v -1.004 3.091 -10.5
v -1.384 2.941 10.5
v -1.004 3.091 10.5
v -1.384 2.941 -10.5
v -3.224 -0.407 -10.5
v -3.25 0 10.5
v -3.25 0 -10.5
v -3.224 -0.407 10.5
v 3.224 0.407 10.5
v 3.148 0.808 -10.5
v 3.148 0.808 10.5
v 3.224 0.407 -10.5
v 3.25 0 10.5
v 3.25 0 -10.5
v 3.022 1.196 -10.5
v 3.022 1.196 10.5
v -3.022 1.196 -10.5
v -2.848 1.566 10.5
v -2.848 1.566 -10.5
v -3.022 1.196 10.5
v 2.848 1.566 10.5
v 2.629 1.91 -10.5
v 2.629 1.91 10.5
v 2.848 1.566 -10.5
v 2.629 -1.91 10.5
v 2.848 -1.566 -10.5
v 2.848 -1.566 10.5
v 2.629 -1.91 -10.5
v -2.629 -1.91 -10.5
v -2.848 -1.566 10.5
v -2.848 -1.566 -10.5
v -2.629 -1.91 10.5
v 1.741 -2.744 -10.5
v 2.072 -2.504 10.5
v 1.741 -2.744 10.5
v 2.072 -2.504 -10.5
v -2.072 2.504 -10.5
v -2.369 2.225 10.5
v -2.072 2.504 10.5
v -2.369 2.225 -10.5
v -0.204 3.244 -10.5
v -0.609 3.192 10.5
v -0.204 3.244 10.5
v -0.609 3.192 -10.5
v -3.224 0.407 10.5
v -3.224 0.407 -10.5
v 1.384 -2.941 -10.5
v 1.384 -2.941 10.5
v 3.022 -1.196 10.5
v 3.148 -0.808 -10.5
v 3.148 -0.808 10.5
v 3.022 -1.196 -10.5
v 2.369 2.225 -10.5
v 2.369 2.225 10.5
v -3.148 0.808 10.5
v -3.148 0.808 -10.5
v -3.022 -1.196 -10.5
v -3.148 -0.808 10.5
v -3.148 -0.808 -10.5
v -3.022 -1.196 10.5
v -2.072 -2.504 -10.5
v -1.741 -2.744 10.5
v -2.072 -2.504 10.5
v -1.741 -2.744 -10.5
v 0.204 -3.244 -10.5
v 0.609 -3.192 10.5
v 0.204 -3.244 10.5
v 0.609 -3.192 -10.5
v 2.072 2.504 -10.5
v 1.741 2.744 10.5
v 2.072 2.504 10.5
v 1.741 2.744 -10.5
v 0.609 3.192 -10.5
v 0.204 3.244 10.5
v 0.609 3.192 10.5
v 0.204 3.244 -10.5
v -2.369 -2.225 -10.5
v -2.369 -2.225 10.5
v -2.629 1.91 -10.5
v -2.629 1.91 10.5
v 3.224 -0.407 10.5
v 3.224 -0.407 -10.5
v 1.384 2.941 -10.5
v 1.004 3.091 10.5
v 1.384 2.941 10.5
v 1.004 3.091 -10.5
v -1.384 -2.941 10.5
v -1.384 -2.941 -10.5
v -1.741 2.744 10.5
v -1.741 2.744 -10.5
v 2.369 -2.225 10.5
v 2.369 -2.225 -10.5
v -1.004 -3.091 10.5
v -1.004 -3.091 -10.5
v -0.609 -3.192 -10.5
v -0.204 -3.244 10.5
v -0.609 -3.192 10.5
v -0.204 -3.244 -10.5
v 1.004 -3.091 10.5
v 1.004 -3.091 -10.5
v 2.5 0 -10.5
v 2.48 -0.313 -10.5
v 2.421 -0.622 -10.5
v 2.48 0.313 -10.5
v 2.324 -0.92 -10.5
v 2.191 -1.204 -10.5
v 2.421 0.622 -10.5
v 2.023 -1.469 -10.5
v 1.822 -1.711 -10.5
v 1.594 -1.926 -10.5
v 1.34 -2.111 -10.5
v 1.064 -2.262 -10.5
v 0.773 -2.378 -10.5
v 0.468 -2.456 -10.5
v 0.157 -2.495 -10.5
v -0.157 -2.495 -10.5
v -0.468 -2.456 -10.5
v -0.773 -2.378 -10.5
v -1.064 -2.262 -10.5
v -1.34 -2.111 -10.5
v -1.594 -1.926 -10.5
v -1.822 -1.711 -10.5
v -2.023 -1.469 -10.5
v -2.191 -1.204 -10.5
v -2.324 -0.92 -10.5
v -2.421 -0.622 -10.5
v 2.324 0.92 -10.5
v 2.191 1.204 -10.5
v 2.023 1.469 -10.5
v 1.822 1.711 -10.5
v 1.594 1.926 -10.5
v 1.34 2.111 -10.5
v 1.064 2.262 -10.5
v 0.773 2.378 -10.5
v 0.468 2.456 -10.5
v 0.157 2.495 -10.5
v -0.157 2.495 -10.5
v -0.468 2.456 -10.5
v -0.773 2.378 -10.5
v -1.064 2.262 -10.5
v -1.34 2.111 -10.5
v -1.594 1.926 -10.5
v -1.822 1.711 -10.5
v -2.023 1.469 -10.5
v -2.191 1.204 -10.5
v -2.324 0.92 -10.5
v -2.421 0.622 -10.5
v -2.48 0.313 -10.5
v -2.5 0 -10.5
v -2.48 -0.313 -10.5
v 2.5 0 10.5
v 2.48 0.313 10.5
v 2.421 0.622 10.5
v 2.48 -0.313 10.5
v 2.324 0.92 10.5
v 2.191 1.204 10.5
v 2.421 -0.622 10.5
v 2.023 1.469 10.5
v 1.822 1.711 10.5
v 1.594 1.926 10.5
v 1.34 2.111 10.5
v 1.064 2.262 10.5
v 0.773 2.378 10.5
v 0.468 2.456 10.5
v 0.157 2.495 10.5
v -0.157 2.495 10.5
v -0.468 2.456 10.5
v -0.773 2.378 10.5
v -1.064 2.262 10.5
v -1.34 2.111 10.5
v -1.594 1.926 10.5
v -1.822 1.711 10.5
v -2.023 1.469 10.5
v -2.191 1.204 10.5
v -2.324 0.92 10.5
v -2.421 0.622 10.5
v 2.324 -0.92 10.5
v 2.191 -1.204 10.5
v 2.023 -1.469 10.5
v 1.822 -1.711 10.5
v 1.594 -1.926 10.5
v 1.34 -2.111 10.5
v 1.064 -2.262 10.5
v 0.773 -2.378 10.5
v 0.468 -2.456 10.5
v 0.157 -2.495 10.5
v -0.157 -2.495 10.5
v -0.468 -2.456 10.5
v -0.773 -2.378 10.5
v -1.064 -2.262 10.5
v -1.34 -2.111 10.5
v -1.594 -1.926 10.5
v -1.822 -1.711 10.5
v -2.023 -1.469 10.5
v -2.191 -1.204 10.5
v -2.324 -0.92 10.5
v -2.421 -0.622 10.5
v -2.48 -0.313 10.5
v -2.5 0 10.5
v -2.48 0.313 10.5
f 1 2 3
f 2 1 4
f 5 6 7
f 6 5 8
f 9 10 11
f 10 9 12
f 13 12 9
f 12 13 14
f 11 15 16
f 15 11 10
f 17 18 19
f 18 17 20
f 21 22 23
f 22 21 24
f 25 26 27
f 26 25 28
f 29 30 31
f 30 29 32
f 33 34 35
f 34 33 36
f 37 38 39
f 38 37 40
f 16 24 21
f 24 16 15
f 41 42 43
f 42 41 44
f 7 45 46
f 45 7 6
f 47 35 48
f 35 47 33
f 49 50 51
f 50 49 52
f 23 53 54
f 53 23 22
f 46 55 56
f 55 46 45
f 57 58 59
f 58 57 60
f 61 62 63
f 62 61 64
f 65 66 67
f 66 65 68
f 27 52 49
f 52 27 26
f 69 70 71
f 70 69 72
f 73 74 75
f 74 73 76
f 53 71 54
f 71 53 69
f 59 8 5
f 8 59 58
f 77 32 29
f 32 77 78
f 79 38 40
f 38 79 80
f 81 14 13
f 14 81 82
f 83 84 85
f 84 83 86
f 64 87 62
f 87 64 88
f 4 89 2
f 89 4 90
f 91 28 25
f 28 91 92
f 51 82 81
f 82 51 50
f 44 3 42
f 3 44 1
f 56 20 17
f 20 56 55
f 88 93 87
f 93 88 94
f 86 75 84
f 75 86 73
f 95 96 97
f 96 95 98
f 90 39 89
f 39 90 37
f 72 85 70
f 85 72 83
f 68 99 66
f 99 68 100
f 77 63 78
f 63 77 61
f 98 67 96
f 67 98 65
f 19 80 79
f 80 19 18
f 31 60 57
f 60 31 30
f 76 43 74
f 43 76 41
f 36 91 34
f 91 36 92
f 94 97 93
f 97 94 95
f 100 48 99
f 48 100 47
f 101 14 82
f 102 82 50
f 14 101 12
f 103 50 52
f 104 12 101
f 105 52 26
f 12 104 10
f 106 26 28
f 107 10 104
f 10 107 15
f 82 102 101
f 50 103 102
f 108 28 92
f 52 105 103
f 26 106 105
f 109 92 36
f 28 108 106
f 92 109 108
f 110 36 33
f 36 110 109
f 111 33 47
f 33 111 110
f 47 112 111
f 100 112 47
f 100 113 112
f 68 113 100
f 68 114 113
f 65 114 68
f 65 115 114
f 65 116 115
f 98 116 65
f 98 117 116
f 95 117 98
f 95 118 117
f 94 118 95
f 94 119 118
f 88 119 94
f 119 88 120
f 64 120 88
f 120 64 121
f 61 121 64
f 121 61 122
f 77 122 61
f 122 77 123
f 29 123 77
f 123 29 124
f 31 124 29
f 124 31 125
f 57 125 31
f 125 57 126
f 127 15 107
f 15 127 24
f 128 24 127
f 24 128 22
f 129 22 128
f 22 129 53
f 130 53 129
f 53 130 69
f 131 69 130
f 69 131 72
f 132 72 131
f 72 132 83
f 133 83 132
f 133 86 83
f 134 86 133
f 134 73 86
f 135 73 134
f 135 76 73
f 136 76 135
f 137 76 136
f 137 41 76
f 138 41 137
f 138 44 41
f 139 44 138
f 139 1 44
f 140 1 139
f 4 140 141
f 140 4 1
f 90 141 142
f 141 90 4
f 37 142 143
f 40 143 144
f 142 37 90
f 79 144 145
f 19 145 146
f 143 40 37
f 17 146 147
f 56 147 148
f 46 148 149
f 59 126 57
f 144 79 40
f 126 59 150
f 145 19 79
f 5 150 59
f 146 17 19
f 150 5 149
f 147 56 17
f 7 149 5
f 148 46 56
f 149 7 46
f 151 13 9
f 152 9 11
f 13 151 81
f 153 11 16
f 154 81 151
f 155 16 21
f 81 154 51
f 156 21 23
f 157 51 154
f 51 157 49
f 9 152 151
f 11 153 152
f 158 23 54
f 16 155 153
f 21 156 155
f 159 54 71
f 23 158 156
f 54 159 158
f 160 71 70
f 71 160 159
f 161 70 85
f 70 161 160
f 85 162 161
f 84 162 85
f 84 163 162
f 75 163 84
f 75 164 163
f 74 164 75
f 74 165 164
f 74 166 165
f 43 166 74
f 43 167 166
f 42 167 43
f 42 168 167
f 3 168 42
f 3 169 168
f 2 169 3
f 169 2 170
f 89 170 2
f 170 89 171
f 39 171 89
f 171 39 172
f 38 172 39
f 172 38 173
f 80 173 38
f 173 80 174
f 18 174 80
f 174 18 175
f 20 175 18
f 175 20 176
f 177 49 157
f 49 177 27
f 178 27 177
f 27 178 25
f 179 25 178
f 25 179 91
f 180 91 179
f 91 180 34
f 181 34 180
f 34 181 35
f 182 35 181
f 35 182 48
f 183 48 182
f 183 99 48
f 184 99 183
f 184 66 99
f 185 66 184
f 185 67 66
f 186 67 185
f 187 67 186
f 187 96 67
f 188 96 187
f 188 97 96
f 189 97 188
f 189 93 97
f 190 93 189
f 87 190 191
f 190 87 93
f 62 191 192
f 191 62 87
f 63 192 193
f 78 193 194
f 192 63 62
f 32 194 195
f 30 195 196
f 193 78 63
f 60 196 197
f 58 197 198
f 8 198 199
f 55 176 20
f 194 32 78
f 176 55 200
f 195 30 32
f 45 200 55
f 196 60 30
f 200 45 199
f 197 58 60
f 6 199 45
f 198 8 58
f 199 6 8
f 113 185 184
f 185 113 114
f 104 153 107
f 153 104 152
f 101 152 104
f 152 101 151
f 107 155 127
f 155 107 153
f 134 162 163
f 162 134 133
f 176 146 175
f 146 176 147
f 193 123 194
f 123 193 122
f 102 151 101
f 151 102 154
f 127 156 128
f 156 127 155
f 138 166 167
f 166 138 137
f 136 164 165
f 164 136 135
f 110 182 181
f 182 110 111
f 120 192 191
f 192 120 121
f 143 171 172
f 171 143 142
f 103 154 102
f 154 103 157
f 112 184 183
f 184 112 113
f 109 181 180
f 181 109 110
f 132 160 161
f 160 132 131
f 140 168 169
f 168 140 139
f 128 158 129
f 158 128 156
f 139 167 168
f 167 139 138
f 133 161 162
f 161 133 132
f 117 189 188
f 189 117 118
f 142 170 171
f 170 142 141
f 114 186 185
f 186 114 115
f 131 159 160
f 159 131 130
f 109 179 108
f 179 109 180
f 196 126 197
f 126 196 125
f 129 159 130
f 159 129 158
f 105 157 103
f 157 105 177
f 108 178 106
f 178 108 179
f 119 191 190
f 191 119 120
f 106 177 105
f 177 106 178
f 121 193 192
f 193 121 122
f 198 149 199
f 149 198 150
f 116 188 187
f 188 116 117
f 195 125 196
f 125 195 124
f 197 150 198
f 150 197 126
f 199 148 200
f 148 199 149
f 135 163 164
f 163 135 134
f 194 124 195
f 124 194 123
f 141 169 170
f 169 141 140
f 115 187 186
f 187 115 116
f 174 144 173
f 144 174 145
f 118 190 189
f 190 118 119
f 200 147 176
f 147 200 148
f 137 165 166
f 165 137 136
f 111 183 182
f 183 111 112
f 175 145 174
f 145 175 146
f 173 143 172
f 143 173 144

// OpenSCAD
$fn = 50;


difference() {
	union() {
		translate(v = [0, 0, -10.5000000000]) {
			cylinder(h = 21, r = 3.2500000000);
		}
	}
	union() {
		translate(v = [0, 0, -100.0000000000]) {
			cylinder(h = 200, r = 2.5000000000);
		}
	}
}
